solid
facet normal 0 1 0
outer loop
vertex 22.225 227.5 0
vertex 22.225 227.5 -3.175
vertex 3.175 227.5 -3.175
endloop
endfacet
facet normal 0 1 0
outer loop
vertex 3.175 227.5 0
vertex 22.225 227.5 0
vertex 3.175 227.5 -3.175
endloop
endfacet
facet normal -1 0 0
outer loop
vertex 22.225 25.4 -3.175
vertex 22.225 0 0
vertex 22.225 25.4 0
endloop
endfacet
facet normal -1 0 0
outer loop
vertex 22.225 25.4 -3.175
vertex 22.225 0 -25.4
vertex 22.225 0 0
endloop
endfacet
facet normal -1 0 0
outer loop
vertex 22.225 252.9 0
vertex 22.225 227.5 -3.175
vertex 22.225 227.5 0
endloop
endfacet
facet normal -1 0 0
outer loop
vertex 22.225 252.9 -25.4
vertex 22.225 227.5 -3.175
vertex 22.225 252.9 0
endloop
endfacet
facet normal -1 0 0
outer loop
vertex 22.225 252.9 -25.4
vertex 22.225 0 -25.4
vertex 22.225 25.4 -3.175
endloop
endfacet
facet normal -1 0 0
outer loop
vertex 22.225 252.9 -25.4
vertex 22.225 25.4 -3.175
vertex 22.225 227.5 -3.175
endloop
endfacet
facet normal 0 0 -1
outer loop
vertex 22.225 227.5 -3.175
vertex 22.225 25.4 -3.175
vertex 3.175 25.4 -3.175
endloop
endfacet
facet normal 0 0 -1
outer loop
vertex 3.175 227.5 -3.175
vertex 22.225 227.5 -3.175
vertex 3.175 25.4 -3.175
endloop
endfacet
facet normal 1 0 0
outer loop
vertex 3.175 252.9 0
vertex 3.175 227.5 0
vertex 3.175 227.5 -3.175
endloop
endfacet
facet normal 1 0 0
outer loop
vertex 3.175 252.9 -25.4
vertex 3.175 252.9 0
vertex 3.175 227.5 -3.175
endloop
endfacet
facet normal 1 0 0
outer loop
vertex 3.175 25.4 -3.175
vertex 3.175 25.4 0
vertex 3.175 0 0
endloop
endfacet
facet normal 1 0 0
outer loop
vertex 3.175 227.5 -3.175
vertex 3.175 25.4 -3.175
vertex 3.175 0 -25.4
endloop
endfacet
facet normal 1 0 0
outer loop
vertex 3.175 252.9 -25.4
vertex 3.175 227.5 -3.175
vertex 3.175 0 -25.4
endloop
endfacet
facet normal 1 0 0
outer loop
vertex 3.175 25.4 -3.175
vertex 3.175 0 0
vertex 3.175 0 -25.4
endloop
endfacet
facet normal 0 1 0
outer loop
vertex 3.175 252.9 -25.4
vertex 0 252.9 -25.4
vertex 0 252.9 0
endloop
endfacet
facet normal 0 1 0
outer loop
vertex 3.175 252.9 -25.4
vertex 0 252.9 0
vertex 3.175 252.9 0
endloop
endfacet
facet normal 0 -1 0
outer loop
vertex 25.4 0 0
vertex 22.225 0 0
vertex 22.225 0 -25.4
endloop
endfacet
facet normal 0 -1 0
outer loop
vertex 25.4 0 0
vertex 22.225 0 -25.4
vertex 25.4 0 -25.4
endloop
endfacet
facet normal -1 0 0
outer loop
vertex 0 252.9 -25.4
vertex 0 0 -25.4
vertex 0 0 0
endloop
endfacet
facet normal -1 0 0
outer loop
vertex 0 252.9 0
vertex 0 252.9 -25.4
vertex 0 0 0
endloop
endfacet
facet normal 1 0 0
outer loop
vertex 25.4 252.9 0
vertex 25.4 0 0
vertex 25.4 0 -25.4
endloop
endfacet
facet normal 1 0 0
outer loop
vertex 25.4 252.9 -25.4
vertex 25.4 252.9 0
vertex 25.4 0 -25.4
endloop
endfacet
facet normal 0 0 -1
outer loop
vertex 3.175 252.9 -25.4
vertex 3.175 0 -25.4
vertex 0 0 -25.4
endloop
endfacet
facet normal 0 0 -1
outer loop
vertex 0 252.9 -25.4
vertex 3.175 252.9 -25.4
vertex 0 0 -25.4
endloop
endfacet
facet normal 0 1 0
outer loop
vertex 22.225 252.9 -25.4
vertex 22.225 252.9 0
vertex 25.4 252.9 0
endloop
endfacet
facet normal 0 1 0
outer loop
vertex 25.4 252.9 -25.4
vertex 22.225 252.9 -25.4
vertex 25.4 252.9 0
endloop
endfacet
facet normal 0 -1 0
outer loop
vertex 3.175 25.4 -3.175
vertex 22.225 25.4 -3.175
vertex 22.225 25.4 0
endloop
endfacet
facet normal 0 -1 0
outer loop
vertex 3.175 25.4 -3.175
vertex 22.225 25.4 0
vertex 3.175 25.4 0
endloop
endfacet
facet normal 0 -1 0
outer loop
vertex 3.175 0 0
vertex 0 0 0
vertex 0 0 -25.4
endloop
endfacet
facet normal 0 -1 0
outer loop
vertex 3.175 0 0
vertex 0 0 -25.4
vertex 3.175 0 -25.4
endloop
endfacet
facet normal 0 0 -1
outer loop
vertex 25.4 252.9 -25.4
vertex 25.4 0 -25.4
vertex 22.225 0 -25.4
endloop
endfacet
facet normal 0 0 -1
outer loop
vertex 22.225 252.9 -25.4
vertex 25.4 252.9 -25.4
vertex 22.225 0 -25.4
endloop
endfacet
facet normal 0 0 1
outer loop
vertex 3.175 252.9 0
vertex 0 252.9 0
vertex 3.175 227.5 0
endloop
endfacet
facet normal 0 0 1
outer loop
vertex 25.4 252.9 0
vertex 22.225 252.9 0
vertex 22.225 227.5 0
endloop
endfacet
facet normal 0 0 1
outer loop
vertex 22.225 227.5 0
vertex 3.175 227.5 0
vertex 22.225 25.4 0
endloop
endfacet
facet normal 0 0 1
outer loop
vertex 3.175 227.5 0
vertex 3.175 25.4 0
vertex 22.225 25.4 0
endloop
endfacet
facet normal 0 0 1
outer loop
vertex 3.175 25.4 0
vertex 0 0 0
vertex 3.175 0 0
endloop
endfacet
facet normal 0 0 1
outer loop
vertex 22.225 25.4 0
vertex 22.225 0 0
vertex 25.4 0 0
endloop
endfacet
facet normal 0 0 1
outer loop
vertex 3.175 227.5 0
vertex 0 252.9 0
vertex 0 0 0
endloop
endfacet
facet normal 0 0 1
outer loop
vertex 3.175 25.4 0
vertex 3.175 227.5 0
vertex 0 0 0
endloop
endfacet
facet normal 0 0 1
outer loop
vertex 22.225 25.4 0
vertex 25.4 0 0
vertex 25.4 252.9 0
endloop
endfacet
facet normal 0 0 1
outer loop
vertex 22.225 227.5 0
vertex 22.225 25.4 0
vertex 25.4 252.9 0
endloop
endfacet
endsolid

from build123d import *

# Parameters (mm, degrees)
EXTRUDE_THIN1_DEPTH = 252.9
SKETCH2_W           = 19.05
SKETCH2_H           = 25.4
CUT_EXTRUDE1_DEPTH  = 3.175


with BuildPart() as part:
    # Sketch1 → Extrude-Thin1 (new body)
    with BuildSketch(Plane(origin=(0, 0, 0), x_dir=(1, 0, 0), z_dir=(0, 1, 0))):
        Polygon((0, 25.4), (0, 0), (25.4, 0), (25.4, 25.4), (22.225, 25.4), (22.225, 3.175), (3.175, 3.175), (3.175, 25.4), align=None)
    extrude(amount=EXTRUDE_THIN1_DEPTH)

    # Sketch2 → Cut-Extrude1 (cut)
    with BuildSketch(Plane(origin=(0, 0, -3.175), x_dir=(-1, 0, 0), z_dir=(0, 0, -1))):
        with Locations((-12.7, 12.7)):
            Rectangle(SKETCH2_W, SKETCH2_H)
        with Locations((-12.7, 240.2)):
            Rectangle(SKETCH2_W, SKETCH2_H)
    extrude(amount=-CUT_EXTRUDE1_DEPTH, mode=Mode.SUBTRACT)


solid = part.part
